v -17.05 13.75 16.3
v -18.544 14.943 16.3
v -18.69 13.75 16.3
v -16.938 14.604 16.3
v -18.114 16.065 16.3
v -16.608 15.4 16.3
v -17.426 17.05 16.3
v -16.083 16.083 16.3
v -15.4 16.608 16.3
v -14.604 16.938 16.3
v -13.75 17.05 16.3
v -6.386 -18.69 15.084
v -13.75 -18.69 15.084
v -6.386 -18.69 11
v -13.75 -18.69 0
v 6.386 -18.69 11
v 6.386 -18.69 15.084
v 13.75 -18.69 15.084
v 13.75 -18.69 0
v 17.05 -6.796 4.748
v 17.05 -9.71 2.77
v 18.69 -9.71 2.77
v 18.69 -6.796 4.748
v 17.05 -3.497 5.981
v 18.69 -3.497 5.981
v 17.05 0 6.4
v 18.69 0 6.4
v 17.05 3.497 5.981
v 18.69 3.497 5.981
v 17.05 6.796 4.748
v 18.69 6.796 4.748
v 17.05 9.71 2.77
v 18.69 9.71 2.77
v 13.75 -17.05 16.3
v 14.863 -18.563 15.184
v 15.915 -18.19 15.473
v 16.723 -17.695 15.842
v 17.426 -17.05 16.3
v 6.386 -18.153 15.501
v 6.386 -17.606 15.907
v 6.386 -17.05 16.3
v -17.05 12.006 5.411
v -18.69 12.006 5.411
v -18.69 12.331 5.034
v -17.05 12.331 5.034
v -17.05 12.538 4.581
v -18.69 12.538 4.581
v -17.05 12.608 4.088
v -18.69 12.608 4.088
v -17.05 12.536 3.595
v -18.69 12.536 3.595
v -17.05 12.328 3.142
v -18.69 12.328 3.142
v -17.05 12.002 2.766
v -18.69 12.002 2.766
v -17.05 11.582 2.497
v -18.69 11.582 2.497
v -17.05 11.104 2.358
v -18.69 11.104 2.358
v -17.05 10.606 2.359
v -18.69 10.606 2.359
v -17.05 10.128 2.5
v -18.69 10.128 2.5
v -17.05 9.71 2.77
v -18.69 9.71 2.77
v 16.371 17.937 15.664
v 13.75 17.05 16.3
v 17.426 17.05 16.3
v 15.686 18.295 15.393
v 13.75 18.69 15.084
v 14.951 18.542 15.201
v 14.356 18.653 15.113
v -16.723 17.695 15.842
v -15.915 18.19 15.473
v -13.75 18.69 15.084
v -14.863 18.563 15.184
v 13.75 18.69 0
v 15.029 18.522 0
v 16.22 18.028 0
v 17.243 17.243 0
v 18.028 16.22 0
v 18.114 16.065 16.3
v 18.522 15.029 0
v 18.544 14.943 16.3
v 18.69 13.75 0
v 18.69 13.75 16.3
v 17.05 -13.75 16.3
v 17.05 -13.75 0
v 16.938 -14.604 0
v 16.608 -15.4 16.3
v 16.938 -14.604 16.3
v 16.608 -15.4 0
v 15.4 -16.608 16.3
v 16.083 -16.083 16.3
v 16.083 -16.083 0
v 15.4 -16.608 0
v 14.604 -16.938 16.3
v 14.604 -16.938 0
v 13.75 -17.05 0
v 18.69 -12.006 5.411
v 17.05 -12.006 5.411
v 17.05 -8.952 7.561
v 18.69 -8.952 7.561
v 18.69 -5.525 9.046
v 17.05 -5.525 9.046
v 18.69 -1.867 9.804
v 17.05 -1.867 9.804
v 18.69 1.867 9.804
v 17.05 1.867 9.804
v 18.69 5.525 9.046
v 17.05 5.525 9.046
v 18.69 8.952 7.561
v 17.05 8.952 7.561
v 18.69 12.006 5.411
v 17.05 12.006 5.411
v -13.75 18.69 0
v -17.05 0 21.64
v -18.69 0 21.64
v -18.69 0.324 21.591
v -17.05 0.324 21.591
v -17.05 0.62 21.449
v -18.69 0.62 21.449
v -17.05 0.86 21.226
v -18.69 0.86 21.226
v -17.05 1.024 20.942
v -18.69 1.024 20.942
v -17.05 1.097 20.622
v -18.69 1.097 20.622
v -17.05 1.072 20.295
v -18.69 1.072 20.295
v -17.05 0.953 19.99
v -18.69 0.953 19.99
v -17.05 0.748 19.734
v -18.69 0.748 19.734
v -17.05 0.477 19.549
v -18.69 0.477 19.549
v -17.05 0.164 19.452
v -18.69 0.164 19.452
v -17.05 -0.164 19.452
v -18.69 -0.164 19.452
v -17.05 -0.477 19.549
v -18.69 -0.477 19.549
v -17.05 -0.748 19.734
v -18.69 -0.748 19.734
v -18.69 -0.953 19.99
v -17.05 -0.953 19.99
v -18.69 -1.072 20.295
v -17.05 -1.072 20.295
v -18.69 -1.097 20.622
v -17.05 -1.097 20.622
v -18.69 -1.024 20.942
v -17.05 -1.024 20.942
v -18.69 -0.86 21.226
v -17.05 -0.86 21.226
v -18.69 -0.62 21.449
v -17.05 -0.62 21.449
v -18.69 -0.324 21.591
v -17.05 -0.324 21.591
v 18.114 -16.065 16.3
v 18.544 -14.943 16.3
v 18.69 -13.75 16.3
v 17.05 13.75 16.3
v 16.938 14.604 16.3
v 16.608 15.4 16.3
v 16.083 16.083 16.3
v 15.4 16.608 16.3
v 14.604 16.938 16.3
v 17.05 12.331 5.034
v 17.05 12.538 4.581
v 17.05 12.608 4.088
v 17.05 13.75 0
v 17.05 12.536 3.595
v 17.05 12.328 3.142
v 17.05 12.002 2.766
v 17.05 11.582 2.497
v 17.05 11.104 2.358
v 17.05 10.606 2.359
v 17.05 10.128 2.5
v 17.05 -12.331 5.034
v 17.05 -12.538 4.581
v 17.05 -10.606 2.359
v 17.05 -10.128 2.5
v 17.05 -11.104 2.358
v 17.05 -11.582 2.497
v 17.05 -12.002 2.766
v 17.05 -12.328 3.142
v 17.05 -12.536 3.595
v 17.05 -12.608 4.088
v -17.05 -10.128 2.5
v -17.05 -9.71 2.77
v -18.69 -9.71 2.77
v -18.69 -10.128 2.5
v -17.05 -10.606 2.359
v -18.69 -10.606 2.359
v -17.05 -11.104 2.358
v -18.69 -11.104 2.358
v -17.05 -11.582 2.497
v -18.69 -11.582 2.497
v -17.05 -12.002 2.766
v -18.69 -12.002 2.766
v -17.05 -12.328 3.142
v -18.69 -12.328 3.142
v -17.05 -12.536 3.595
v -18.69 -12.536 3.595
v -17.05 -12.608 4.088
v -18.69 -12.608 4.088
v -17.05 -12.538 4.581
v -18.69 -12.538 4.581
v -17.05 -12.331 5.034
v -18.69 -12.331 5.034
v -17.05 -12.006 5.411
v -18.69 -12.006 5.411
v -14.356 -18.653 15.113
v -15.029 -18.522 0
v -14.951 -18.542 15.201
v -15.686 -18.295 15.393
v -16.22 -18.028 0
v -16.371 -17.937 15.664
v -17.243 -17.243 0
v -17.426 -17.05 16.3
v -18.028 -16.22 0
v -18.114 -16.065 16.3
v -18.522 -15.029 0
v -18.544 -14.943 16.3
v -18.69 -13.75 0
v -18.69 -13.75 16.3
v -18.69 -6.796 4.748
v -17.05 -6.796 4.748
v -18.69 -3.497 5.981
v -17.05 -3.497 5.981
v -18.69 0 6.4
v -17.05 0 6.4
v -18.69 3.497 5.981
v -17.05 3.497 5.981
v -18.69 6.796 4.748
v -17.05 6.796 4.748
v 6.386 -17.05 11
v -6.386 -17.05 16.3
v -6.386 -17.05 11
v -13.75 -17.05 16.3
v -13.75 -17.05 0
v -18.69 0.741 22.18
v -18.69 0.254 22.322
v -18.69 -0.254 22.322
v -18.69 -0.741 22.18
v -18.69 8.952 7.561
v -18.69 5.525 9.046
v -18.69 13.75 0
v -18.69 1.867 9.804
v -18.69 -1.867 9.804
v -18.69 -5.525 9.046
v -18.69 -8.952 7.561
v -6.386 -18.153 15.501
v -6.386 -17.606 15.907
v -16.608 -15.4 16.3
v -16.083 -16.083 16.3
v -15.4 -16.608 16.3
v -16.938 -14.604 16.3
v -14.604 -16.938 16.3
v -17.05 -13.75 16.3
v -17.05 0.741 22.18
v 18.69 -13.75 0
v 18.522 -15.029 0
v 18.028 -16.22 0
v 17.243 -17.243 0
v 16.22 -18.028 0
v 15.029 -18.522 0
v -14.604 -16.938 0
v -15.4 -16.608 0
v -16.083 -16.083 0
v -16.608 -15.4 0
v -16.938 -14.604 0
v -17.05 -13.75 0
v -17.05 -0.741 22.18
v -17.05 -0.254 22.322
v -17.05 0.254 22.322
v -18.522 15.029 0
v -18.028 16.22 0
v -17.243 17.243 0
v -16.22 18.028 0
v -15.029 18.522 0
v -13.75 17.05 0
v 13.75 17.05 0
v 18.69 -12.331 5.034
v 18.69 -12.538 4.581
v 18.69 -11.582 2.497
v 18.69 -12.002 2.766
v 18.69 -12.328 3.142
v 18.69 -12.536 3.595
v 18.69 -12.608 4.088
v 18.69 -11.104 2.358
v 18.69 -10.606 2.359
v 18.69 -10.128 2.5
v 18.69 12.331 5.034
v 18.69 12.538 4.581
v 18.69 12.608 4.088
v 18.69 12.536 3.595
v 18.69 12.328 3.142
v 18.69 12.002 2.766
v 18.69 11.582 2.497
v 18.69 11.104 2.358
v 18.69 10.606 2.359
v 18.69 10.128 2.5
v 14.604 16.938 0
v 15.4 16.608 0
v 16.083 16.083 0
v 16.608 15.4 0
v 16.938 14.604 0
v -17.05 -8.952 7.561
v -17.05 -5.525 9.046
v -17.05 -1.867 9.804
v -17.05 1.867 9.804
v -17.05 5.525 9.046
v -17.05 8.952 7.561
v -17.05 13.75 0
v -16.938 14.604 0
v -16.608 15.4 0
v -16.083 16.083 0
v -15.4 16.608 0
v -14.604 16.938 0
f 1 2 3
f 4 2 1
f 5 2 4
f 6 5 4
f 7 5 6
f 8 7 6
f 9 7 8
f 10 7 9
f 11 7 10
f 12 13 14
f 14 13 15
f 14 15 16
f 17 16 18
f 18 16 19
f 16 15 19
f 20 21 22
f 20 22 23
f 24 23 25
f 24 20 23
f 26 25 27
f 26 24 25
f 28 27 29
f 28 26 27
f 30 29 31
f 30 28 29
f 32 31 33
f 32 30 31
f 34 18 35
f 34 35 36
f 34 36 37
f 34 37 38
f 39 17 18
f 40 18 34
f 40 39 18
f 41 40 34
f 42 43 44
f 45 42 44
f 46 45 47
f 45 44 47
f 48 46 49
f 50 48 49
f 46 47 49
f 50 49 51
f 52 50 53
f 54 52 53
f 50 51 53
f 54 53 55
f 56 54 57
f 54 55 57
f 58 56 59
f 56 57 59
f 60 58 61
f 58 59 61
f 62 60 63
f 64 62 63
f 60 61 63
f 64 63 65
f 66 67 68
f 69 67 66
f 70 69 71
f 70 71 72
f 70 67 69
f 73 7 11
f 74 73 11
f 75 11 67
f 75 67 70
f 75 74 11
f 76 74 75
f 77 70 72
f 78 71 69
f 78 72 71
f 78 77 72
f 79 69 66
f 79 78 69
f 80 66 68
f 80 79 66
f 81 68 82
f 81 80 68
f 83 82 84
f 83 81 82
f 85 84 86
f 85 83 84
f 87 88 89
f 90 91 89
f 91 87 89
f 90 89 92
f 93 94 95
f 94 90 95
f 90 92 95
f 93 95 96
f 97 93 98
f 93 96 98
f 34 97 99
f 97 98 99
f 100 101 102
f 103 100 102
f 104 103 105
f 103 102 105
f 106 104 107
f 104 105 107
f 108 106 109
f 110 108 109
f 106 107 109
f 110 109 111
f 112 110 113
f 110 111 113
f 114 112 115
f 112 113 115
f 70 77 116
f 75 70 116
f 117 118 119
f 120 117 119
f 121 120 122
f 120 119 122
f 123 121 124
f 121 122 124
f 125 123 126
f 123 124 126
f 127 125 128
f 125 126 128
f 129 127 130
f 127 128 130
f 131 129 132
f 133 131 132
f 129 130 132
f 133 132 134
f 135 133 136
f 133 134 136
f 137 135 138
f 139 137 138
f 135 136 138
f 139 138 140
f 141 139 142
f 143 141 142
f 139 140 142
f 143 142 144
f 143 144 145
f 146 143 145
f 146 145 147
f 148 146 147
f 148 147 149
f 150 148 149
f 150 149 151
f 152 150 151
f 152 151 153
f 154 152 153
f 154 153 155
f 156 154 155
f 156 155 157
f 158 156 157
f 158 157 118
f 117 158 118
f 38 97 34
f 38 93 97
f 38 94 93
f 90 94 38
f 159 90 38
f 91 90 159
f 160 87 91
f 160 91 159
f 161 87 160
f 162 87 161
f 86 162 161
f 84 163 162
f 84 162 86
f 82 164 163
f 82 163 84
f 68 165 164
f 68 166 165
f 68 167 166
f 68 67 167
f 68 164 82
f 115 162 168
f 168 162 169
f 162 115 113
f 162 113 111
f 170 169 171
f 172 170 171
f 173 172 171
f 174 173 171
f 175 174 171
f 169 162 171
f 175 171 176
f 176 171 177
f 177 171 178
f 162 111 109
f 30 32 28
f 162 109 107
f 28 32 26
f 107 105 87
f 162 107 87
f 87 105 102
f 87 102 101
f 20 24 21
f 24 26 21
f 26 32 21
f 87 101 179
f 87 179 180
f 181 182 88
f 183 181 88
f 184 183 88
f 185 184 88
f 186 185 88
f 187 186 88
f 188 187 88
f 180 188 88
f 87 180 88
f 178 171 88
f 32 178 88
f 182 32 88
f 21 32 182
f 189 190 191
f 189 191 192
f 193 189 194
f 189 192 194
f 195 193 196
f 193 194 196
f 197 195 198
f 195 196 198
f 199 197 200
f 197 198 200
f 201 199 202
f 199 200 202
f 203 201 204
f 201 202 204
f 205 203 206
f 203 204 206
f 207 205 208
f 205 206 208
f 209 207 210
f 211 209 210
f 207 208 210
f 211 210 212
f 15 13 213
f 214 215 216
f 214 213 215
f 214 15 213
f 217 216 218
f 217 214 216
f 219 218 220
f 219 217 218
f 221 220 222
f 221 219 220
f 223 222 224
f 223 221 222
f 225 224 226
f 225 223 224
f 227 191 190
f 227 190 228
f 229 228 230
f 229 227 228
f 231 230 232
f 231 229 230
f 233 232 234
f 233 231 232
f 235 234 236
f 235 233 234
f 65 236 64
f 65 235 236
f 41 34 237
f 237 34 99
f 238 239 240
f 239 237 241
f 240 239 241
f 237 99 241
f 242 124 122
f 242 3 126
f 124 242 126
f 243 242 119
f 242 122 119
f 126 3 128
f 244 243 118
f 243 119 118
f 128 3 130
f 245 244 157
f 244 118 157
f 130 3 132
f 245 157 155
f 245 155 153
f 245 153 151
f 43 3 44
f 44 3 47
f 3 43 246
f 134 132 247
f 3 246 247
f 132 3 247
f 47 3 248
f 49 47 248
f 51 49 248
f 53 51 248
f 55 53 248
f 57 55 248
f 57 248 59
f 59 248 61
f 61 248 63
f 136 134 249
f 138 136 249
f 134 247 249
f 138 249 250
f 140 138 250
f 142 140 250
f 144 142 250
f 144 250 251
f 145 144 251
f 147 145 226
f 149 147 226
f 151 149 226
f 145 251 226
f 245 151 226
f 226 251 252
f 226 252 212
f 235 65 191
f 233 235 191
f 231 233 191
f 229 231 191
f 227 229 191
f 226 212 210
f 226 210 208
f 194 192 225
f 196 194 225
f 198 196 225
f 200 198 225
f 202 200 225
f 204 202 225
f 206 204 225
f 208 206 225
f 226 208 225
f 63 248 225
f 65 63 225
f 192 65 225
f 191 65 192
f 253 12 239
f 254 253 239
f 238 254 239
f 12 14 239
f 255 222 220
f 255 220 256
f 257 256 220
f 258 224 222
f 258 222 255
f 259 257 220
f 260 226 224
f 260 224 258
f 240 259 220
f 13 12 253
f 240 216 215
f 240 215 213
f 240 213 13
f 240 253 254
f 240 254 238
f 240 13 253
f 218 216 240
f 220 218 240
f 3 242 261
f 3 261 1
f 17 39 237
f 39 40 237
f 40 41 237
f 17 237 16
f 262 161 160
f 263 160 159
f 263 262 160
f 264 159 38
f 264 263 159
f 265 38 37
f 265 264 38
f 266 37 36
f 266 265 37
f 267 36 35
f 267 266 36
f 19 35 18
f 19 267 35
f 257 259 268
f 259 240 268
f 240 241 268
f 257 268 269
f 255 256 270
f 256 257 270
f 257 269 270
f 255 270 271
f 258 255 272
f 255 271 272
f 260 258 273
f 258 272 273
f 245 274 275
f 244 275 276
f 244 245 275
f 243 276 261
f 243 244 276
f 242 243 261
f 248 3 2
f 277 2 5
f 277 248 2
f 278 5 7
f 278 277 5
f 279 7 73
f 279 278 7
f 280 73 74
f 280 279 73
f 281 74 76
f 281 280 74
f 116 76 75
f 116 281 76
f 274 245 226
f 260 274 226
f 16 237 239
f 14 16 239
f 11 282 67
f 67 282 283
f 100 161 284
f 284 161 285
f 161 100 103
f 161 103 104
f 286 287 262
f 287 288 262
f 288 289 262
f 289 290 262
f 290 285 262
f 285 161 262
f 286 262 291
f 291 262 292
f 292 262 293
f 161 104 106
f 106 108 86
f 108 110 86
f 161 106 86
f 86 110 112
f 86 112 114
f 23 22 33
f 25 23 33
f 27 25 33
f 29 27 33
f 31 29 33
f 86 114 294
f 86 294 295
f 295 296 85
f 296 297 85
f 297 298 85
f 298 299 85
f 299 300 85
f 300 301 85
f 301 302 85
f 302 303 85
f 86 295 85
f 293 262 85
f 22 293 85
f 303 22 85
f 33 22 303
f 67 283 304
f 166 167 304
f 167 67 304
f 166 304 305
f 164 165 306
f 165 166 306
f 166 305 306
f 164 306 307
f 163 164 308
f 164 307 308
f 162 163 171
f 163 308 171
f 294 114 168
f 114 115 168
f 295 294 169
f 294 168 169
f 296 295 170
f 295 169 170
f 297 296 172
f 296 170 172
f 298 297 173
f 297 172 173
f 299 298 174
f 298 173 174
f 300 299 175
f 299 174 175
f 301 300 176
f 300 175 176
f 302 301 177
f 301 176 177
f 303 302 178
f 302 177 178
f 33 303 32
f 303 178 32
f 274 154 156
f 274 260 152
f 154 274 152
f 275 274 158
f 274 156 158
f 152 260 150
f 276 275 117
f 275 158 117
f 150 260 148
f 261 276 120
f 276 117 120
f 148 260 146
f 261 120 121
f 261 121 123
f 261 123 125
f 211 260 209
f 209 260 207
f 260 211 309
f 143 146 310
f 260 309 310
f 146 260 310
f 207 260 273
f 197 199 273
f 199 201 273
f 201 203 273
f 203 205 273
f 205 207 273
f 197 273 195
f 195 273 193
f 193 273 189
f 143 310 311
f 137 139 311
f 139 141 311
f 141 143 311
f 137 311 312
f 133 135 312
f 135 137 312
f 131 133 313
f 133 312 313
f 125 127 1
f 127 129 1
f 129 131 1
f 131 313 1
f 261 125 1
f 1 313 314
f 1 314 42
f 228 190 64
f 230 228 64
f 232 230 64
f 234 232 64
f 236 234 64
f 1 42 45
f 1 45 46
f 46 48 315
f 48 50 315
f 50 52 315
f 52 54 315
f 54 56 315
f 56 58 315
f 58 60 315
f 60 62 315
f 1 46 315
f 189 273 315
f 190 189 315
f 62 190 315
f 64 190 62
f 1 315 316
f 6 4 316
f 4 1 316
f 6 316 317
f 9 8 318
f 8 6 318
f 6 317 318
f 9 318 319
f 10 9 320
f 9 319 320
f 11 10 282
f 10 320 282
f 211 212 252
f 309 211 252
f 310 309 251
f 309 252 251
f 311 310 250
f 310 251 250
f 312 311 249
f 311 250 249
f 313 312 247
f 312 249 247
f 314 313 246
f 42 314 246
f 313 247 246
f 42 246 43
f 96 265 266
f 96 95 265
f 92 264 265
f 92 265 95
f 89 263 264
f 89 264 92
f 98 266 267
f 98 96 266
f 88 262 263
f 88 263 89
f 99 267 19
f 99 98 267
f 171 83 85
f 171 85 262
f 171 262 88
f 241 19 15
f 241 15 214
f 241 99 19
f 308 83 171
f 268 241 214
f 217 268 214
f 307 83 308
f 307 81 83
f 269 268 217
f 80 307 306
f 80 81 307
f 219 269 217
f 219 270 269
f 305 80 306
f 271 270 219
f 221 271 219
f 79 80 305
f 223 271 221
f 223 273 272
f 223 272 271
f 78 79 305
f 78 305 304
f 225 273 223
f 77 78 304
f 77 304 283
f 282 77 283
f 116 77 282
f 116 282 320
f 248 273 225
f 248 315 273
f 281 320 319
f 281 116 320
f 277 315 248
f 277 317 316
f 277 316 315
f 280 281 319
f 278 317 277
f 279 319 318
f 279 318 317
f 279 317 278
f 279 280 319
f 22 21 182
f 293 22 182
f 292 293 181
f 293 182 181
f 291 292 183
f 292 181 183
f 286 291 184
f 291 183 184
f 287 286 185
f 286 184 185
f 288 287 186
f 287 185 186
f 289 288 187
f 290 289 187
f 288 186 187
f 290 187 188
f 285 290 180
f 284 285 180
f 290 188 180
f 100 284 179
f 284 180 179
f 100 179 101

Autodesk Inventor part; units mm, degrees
ref_plane "YZ Plane" through (0, 0, 0) normal (1, 0, 0) x (0, 1, 0)
ref_plane "РабПлоскость1" through (-16.75, -17.4, 16.3) normal (0, 0, 1) x (1, 0, 0)
sketch "Эскиз1" plane through (0, 0, 0) normal (0, 0, 1) x (1, 0, 0)
  line L0 (-18.1779, 4.2816) -> (-18.69, 4.2816) projected
  line L1 (-18.69, 4.2816) -> (-18.69, -13.75) projected
  arc A0 (-18.69, -13.75) -> (-13.75, -18.69) centre (-13.75, -13.75) ccw projected
  line L2 (-13.75, -18.69) -> (13.75, -18.69) projected
  arc A1 (13.75, -18.69) -> (18.69, -13.75) centre (13.75, -13.75) ccw projected
  line L3 (18.69, -13.75) -> (18.69, 13.75) projected
  arc A2 (18.69, 13.75) -> (13.75, 18.69) centre (13.75, 13.75) ccw projected
  line L4 (13.75, 18.69) -> (-13.75, 18.69) projected
  arc A3 (-13.75, 18.69) -> (-18.69, 13.75) centre (-13.75, 13.75) ccw projected
  line L5 (-18.69, 13.75) -> (-18.69, 9.7184) projected
  line L6 (-18.69, 9.7184) -> (-18.1779, 9.7184) projected
  line L7 (-18.1779, 13.75) -> (-18.1779, 9.7184) projected
  arc A4 (-13.75, 18.1779) -> (-18.1779, 13.75) centre (-13.75, 13.75) ccw projected
  line L8 (13.75, 18.1779) -> (-13.75, 18.1779) projected
  arc A5 (18.1779, 13.75) -> (13.75, 18.1779) centre (13.75, 13.75) ccw projected
  line L9 (18.1779, -13.75) -> (18.1779, 13.75) projected
  arc A6 (13.75, -18.1779) -> (18.1779, -13.75) centre (13.75, -13.75) ccw projected
  line L10 (-13.75, -18.1779) -> (13.75, -18.1779) projected
  arc A7 (-18.1779, -13.75) -> (-13.75, -18.1779) centre (-13.75, -13.75) ccw projected
  line L11 (-18.1779, 4.2816) -> (-18.1779, -13.75) projected
  line L12 (-18.1779, 4.2816) -> (-18.69, 4.2816)
  line L13 (-18.69, 4.2816) -> (-18.69, 9.7184)
  line L14 (-18.69, 9.7184) -> (-18.1779, 9.7184)
  line L15 (-18.1779, 9.7184) -> (-18.1779, 4.2816)
  line L16 (-13.75, 16.45) -> (10.2, 16.45) projected
  arc A8 (-13.75, 16.45) -> (-16.75, 13.45) centre (-13.75, 13.45) ccw projected
  line L17 (-16.75, -10.2) -> (-16.75, 13.45) projected
  arc A9 (-16.75, -10.2) -> (-15.75, -11.2) centre (-15.75, -10.2) ccw projected
  line L18 (-14.1, -11.2) -> (-15.75, -11.2) projected
  arc A10 (-11.2, -14.1) -> (-14.1, -11.2) centre (-14.1, -14.1) ccw projected
  line L19 (-11.2, -14.1) -> (-11.2, -15.75) projected
  arc A11 (-11.2, -15.75) -> (-10.2, -16.75) centre (-10.2, -15.75) ccw projected
  line L20 (-6.3858, -16.75) -> (-10.2, -16.75) projected
  arc A12 (-5.9929, -17.075) -> (-6.3858, -16.75) centre (-6.3858, -17.15) ccw projected
  arc A13 (-5.9929, -17.075) -> (-5.6, -17.4) centre (-5.6, -17) ccw projected
  line L21 (-5.6, -17.4) -> (5.6, -17.4) projected
  arc A14 (5.6, -17.4) -> (5.9929, -17.075) centre (5.6, -17) ccw projected
  arc A15 (6.3858, -16.75) -> (5.9929, -17.075) centre (6.3858, -17.15) ccw projected
  line L22 (12.1982, -16.75) -> (6.3858, -16.75) projected
  arc A16 (12.1982, -16.75) -> (13.1981, -15.7356) centre (12.1982, -15.75) ccw projected
  arc A17 (15.7351, -13.198) -> (13.1981, -15.7356) centre (15.6978, -15.6978) ccw projected
  arc A18 (15.7351, -13.198) -> (16.75, -12.1982) centre (15.75, -12.1982) ccw projected
  line L23 (16.75, -12.1982) -> (16.75, 10.2) projected
  arc A19 (16.75, 10.2) -> (15.75, 11.2) centre (15.75, 10.2) ccw projected
  line L24 (14.1, 11.2) -> (15.75, 11.2) projected
  arc A20 (11.2, 14.1) -> (14.1, 11.2) centre (14.1, 14.1) ccw projected
  line L25 (11.2, 15.45) -> (11.2, 14.1) projected
  arc A21 (11.2, 15.45) -> (10.2, 16.45) centre (10.2, 15.45) ccw projected
  circle A22 centre (7, 14.5) radius 0.95 projected
  circle A23 centre (0, 14.6) radius 0.75 projected
  circle A24 centre (-7.5, -13.8) radius 0.95 projected
  circle A25 centre (-14.9, 2) radius 0.75 projected
  circle A26 centre (8.272, -2.7758) radius 0.5 projected
  circle A27 centre (8.6932, -0.0132) radius 0.5 projected
  circle A28 centre (8.2597, 2.7621) radius 0.5 projected
  circle A29 centre (-2.2984, 14.2551) radius 0.5 projected
  circle A30 centre (-4.5412, 14.2552) radius 0.5 projected
  circle A31 centre (13.75, -13.75) radius 3.5
  circle A32 centre (-13.75, -13.75) radius 3.5
  circle A33 centre (13.75, 13.75) radius 3.5
  circle A34 centre (-13.75, 13.75) radius 3.5
  line L26 (-17.25, 13.75) -> (-17.25, -13.75)
  line L27 (-13.75, -17.25) -> (13.75, -17.25)
  line L28 (17.25, -13.75) -> (17.25, 13.75)
  line L29 (13.75, 17.25) -> (-13.75, 17.25)
  arc A35 (13.75, -17.25) -> (17.25, -13.75) centre (13.75, -13.75) ccw
  arc A36 (-17.25, -13.75) -> (-13.75, -17.25) centre (-13.75, -13.75) ccw
  arc A37 (-13.75, 17.25) -> (-17.25, 13.75) centre (-13.75, 13.75) ccw
  arc A38 (17.25, 13.75) -> (13.75, 17.25) centre (13.75, 13.75) ccw
  line L30 (-13.75, 17.05) -> (13.75, 17.05)
  arc A39 (17.05, 13.75) -> (13.75, 17.05) centre (13.75, 13.75) ccw
  line L31 (17.05, 13.75) -> (17.05, -13.75)
  arc A40 (13.75, -17.05) -> (17.05, -13.75) centre (13.75, -13.75) ccw
  line L32 (13.75, -17.05) -> (-13.75, -17.05)
  arc A41 (-17.05, -13.75) -> (-13.75, -17.05) centre (-13.75, -13.75) ccw
  line L33 (-17.05, -13.75) -> (-17.05, 13.75)
  arc A42 (-13.75, 17.05) -> (-17.05, 13.75) centre (-13.75, 13.75) ccw
  line L34 (6.3858, -18.69) -> (-6.3858, -18.69)
  line L35 (-6.3858, -18.69) -> (-6.3858, -14.69)
  line L36 (-6.3858, -14.69) -> (6.3858, -14.69)
  line L37 (6.3858, -14.69) -> (6.3858, -18.69)
  point P0 (0, 0)
  point P1 (12.5838, -17.05)
  point P2 (5.9122, -17.25)
  point P3 (5.9985, -17.05)
  point P4 (-6.3858, -17.05)
  point P5 (6.3858, -17.05)
  point P6 (-6.3858, -18.69)
  dimension "d0" = 7
  dimension "d2" = 7
  dimension "d3" = 7
  dimension "d4" = 7
  dimension "d5" = 0.2
  dimension "d8" = 4
extrude "Выдавливание1" add sketch "Эскиз1" along normal up to surface (16.3 mm away) contours L11 A7 L10 L35 L2 A0 L1 L0 | L15 L7 A4 L8 A5 L9 A6 L10 L37 L27 A31 L28 A33 L29 A34 L26 A32 L35 A7 L11 | L0 L13 L6 L15 | L6 L5 A3 L4 A2 L3 A1 L2 L37 L10 A6 L9 A5 L8 A4 L7 | L27 A32 L32 L35 | L37 L32 A31 L27 | A32 L33 A41 L32 | A31 L32 A40 L31 | L26 A34 L33 A32 | A31 L31 A33 L28 | A34 L30 A42 L33 | A33 L31 A39 L30 | L29 A33 L30 A34
sketch "Эскиз2" plane through (0, 0, 0) normal (0, 0, -1) x (-1, 0, 0)
  line L0 (6.3858, -18.69) -> (6.3858, -17.05) projected
  line L1 (-6.3858, -17.05) -> (-6.3858, -18.69) projected
  line L2 (6.3858, -18.69) -> (-6.3858, -18.69)
  line L3 (-6.3858, -18.69) -> (-6.3858, -17.05)
  line L4 (-6.3858, -17.05) -> (6.3858, -17.05)
  line L5 (6.3858, -17.05) -> (6.3858, -18.69)
  point P0 (0, 0)
extrude "Выдавливание2" add sketch "Эскиз2" against normal blind 11
sketch "Эскиз3" plane through (-18.69, -13.75, 0) normal (-1, 0, 0) x (0, 0, 1)
  circle A0 centre (-8.4, 13.75) radius 18.69 projected
  line L0 (0, 13.75) -> (16.3, 13.75)
  line L1 (16.3, 27.5) -> (16.3, 0) projected
  circle A1 centre (-8.4, 13.75) radius 14.8
  line L2 (0, 13.75) -> (16.3, 13.75)
  line L3 (0, 0) -> (0, 27.5) projected
  circle A2 centre (8.15, 13.75) radius 1.75
  circle A3 centre (-8.4, 13.75) radius 18.3
  circle A4 centre (4.0904, 24.6078) radius 1.75
  circle A5 centre (4.0904, 2.8922) radius 1.75
  line L4 (-8.4, 13.75) -> (22.7381, 2.4167) projected
  line L5 (-8.4, 13.75) -> (22.7381, 25.0833) projected
  line L6 (4.0904, 2.8922) -> (-8.4, 13.75)
  line L7 (-8.4, 13.75) -> (4.0904, 24.6078)
  circle A6 centre (7.5861, 18.0335) radius 1.75
  circle A7 centre (7.5861, 9.4665) radius 1.75
  line L8 (-8.4, 13.75) -> (7.5861, 18.0335)
  line L9 (7.5861, 9.4665) -> (-8.4, 13.75)
  point P0 (5.4112, 25.7559)
  point P1 (2.7697, 23.4597)
  point P2 (2.7697, 4.0403)
  point P3 (5.4112, 1.7441)
  dimension "d12" = 3.5
  dimension "d13" = 3.5
  dimension "d14" = 3.5
  dimension "d26" = 30
  dimension "d27" = 15
  dimension "d28" = 26
  dimension "d29" = 26
extrude "Выдавливание3" cut sketch "Эскиз3" against normal blind 40 contours A2 L0 | L0 A2 | A3 A7 A1 A2 | A2 A1 A6 A3 | L5 A6 A1 A4 A3 | A3 A6 L5 | L4 A7 A3 | A3 A5 A1 L4 A7 | A6 L5 | A7 L4 | A4 | L5 A6 | A5 | A7 L4 | A1 L5 A6 | A7 L4 A1
sketch "Эскиз5" plane through (-18.69, -13.75, 16.3) normal (-1, 0, 0) x (0, 0, 1)
  circle A0 centre (4.2399, 13.75) radius 1.1 projected
  circle A1 centre (4.2399, 13.75) radius 1.8
  line L0 (5.8801, 13.0086) -> (0, 0)
  line L1 (0, 27.5) -> (0, 0) projected
  line L2 (5.8801, 14.4914) -> (0, 27.5)
  point P0 (-16.3, 13.75)
  dimension "d23" = 3.6
extrude "Выдавливание5" add sketch "Эскиз5" against normal up to surface (1.64 mm away)
sketch "Эскиз6" plane through (-18.69, -13.75, 0) normal (-1, 0, 0) x (0, 0, 1)
  circle A0 centre (-8.4, 13.75) radius 30.7399 projected
  line L0 (0, -3.3) -> (16.3, -3.3) projected
  line L1 (0, 30.8) -> (16.3, 30.8) projected
  line L2 (16.3, -3.3) -> (16.3, 0) projected
  circle A1 centre (-8.4, 13.75) radius 30.0132
  circle A2 centre (-8.4, 13.75) radius 32.0132
  line L3 (16.3, -3.3) -> (18.6951, -3.3)
  line L4 (11, -4.94) -> (16.3, -4.94) projected
  line L5 (15.0835, -4.94) -> (17.5909, -4.94)
  line L6 (0, 30.8) -> (16.3, 30.8) projected
  line L7 (16.3, 30.8) -> (18.6951, 30.8)
  line L8 (0, 32.44) -> (16.3, 32.44) projected
  line L9 (15.0835, 32.44) -> (17.5909, 32.44)
  point P0 (0, 13.75)
  point P1 (16.3, 30.8)
  dimension "d30" = 2
ref_plane "РабПлоскость2" through (19.19, -20.45, 0) normal (-1, 0, 0) x (0, 0, 1)
extrude "Выдавливание6" cut sketch "Эскиз6" against normal blind 40 contours L7 A1 L8 A0 | A0 L8 L9 A2 L7 | L3 A2 L5 L4 A0 | A0 L4 A1 L3
equation "\"d27\" = 0.5 * d26"
properties part number "lidar_base"
